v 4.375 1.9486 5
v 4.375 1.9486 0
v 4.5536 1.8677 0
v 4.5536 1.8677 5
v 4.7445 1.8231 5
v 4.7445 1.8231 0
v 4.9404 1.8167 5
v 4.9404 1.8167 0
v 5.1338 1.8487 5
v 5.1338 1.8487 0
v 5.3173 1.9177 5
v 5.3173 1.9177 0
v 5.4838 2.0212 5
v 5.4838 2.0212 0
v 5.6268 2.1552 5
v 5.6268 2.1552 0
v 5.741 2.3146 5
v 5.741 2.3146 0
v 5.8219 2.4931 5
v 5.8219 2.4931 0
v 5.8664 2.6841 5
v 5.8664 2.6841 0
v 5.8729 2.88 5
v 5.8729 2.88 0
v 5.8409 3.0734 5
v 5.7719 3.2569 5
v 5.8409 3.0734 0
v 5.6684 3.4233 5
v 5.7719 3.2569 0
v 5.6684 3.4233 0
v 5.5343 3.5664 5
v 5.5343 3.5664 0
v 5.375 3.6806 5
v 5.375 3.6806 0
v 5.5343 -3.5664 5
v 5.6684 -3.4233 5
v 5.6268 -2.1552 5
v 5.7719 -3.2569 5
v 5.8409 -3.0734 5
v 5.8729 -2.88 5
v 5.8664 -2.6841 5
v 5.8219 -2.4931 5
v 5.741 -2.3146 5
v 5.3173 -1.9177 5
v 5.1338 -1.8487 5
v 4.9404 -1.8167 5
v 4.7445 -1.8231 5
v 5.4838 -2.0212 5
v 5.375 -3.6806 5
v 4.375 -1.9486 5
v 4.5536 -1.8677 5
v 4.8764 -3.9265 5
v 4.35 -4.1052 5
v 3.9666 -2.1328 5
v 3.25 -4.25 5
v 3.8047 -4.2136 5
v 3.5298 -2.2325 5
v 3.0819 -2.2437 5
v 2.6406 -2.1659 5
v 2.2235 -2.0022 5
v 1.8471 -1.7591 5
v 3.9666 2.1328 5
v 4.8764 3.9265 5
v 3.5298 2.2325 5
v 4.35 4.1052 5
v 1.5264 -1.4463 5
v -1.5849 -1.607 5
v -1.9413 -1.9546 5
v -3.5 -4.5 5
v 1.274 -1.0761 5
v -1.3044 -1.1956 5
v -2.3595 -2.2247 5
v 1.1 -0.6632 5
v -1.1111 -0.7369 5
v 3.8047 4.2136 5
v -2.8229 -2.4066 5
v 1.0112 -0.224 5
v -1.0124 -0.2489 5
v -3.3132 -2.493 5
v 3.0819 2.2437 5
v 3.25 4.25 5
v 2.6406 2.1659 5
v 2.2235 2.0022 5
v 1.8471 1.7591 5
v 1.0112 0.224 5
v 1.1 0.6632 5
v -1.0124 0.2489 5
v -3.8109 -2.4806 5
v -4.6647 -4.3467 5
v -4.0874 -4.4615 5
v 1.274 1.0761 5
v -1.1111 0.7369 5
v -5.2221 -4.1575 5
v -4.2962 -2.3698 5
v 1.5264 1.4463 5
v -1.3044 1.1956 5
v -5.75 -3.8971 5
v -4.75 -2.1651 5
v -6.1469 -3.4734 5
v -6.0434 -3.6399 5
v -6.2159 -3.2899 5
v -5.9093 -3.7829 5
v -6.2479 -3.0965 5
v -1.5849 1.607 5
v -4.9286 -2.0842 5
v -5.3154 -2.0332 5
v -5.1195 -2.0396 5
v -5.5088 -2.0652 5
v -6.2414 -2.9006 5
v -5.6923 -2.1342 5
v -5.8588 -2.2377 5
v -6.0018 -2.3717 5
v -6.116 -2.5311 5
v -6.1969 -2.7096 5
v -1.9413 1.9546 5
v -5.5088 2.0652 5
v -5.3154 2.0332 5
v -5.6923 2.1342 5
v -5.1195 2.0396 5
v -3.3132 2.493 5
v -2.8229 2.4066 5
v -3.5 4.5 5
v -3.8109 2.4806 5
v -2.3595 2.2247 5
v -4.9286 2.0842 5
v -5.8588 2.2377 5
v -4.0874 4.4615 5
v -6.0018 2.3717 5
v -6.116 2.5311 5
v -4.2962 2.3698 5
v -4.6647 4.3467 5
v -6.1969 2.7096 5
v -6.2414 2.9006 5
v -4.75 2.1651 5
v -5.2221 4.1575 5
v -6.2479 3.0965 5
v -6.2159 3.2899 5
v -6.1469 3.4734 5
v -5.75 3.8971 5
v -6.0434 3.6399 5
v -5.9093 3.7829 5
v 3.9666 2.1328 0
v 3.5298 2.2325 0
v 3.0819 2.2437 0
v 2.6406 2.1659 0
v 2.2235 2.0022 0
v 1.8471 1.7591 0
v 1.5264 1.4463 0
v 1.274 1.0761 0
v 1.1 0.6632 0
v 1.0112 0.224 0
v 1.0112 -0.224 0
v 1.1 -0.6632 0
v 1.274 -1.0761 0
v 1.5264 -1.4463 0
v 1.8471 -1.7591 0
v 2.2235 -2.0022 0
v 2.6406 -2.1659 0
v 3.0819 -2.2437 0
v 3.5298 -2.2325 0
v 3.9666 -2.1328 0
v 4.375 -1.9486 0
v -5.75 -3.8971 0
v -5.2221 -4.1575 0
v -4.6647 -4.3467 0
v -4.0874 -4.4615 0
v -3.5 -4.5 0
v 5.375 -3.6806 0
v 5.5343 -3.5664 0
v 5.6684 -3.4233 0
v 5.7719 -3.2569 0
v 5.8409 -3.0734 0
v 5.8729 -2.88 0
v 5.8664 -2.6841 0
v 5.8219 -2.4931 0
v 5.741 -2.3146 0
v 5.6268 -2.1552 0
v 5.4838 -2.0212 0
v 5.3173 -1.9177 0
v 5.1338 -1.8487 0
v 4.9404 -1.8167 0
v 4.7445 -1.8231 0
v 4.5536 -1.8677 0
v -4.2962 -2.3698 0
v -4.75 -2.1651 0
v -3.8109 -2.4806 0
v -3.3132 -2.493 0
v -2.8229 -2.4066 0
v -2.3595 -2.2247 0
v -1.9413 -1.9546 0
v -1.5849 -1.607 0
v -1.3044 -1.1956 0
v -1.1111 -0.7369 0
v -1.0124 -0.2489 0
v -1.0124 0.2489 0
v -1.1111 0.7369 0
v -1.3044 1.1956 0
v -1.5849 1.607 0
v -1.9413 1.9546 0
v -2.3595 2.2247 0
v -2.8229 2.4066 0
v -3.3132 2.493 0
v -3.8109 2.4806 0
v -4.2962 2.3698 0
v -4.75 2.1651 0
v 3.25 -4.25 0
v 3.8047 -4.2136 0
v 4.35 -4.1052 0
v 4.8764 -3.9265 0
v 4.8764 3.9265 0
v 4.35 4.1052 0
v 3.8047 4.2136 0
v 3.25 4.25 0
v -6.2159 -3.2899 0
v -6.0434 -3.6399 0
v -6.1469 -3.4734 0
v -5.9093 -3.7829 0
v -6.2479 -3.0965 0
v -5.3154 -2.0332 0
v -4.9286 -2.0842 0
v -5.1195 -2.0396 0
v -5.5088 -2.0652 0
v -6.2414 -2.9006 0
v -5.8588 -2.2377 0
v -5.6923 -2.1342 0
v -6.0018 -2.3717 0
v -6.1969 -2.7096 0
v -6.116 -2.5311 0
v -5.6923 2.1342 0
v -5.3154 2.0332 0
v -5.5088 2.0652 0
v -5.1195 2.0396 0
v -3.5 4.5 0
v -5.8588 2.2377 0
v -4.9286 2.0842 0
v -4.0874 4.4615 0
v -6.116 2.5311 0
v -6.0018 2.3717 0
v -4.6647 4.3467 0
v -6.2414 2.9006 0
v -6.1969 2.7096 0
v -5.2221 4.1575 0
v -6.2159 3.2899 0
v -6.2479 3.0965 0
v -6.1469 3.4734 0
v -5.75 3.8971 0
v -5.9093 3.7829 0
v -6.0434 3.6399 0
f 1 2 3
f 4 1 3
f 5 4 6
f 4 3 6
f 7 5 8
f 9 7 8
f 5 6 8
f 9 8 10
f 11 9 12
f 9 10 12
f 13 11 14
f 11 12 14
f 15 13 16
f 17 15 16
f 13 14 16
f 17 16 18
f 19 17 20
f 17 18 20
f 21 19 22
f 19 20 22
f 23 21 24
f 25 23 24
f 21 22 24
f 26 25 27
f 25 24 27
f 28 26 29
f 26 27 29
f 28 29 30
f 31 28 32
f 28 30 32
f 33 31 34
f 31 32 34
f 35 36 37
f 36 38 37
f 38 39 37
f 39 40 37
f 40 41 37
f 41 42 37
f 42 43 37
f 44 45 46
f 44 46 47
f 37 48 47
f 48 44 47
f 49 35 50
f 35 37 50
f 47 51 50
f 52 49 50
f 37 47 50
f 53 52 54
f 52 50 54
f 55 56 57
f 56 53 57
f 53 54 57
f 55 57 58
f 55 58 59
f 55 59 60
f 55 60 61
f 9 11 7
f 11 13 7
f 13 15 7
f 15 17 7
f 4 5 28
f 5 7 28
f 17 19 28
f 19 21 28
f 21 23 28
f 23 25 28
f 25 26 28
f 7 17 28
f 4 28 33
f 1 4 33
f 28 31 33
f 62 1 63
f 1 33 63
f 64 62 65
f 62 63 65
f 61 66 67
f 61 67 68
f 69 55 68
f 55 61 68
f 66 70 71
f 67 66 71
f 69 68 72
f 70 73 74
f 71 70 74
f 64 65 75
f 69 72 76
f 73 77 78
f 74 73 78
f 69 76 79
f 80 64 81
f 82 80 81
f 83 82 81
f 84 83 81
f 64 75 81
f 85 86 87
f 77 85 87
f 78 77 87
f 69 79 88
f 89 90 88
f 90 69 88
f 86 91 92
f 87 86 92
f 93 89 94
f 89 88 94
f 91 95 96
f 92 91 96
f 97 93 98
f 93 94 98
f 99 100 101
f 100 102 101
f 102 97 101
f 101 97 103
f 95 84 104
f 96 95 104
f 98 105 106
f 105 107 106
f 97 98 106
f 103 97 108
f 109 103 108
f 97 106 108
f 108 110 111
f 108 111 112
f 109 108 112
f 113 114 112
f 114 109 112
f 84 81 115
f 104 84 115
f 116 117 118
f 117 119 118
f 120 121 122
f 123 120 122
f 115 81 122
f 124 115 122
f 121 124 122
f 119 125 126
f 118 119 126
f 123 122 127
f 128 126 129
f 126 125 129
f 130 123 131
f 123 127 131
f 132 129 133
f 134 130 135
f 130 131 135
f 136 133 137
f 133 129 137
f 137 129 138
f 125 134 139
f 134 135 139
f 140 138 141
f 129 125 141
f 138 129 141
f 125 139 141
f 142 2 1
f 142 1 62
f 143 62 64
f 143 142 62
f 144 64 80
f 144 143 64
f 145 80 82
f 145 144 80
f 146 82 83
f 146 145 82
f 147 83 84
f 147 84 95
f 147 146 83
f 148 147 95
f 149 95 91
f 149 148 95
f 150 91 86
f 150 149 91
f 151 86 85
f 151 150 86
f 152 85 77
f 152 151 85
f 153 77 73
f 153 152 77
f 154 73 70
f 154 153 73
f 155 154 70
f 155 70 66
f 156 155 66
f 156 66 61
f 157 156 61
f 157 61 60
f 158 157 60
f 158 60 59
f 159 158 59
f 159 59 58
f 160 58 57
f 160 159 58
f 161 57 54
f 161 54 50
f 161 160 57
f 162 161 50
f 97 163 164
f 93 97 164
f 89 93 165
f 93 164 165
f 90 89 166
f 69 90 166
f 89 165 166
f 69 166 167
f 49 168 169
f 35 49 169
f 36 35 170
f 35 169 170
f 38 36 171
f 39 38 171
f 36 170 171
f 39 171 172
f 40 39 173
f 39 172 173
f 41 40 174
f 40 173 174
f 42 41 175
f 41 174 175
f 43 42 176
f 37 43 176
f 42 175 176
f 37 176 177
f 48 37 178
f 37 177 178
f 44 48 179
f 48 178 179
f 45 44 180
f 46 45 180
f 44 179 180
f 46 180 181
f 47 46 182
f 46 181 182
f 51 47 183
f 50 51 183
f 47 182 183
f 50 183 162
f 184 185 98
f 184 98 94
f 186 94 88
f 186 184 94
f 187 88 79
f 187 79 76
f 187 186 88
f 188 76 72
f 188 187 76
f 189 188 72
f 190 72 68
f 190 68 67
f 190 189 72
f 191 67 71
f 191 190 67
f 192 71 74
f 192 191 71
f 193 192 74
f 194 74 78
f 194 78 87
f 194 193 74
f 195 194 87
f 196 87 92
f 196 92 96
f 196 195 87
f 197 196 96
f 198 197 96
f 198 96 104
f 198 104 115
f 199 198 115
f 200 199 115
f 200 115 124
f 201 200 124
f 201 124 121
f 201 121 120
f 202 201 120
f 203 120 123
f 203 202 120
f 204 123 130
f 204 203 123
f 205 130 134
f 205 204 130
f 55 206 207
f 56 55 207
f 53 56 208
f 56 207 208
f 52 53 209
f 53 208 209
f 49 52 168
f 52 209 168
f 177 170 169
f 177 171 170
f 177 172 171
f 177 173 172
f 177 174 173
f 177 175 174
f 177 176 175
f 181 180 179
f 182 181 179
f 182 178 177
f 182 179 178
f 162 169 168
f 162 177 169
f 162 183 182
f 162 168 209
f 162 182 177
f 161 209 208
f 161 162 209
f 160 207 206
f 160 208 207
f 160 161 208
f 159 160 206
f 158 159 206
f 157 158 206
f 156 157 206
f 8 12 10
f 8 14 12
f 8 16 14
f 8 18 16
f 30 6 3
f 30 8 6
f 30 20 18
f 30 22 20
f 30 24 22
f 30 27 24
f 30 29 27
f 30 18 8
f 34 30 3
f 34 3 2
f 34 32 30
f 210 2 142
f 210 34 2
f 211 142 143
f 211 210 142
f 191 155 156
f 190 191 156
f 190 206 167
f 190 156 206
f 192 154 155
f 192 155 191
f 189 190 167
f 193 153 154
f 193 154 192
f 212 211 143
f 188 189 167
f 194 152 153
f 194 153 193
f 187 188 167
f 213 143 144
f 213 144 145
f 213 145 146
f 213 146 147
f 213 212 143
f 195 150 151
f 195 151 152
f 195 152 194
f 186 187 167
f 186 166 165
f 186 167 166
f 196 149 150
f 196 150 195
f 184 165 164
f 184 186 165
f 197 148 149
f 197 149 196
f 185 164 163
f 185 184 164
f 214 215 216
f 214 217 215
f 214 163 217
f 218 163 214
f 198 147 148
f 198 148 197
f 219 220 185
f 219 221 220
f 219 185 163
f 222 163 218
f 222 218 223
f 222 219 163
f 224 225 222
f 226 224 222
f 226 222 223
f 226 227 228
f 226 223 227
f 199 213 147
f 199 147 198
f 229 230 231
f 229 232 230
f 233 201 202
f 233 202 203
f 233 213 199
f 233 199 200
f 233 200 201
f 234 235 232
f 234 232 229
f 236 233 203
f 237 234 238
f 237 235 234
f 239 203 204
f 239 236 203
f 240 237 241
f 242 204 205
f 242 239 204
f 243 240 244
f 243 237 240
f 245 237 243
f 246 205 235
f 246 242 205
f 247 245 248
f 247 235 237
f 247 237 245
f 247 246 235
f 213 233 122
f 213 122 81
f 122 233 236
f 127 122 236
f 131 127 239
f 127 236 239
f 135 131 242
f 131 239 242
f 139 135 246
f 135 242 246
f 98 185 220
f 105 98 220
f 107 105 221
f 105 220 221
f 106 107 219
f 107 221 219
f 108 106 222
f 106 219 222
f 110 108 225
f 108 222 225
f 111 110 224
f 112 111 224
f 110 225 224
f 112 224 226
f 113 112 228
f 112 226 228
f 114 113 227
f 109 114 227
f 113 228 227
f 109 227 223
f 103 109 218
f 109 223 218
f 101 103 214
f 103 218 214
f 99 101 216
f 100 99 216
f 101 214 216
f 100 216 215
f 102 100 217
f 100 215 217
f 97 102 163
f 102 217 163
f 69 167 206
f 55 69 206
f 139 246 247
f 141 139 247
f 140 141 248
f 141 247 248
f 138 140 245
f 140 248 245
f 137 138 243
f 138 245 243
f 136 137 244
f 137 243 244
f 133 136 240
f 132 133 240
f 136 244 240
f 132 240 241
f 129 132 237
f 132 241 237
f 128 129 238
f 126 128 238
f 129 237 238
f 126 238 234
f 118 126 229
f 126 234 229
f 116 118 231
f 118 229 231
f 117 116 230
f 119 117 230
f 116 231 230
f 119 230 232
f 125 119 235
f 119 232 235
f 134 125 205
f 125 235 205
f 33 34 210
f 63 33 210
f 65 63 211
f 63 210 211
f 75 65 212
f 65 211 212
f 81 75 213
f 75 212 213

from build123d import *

# Parameters (mm, degrees)
PAD_DEPTH = 5


with BuildPart() as part:
    # Sketch001 → Pad (new body)
    with BuildSketch(Plane.XY):
        with BuildLine():
            Line((-3.5, 4.5), (3.25, 4.25))
            ThreePointArc((5.375, 3.680608), (4.349981, 4.105185), (3.25, 4.25))
            ThreePointArc((4.375, 1.948557), (5.741025, 2.314583), (5.375, 3.680608))
            ThreePointArc((4.375, 1.948557), (1, 0), (4.375, -1.948557))
            ThreePointArc((5.375, -3.680608), (5.741025, -2.314583), (4.375, -1.948557))
            ThreePointArc((3.25, -4.25), (4.349981, -4.105185), (5.375, -3.680608))
            Line((-3.5, -4.5), (3.25, -4.25))
            ThreePointArc((-5.75, -3.897114), (-4.664686, -4.346666), (-3.5, -4.5))
            ThreePointArc((-4.75, -2.165064), (-6.116025, -2.531089), (-5.75, -3.897114))
            ThreePointArc((-4.75, -2.165064), (-1, 0), (-4.75, 2.165064))
            ThreePointArc((-5.75, 3.897114), (-6.116025, 2.531089), (-4.75, 2.165064))
            ThreePointArc((-3.5, 4.5), (-4.664686, 4.346666), (-5.75, 3.897114))
        make_face()
    extrude(amount=PAD_DEPTH)


solid = part.part
